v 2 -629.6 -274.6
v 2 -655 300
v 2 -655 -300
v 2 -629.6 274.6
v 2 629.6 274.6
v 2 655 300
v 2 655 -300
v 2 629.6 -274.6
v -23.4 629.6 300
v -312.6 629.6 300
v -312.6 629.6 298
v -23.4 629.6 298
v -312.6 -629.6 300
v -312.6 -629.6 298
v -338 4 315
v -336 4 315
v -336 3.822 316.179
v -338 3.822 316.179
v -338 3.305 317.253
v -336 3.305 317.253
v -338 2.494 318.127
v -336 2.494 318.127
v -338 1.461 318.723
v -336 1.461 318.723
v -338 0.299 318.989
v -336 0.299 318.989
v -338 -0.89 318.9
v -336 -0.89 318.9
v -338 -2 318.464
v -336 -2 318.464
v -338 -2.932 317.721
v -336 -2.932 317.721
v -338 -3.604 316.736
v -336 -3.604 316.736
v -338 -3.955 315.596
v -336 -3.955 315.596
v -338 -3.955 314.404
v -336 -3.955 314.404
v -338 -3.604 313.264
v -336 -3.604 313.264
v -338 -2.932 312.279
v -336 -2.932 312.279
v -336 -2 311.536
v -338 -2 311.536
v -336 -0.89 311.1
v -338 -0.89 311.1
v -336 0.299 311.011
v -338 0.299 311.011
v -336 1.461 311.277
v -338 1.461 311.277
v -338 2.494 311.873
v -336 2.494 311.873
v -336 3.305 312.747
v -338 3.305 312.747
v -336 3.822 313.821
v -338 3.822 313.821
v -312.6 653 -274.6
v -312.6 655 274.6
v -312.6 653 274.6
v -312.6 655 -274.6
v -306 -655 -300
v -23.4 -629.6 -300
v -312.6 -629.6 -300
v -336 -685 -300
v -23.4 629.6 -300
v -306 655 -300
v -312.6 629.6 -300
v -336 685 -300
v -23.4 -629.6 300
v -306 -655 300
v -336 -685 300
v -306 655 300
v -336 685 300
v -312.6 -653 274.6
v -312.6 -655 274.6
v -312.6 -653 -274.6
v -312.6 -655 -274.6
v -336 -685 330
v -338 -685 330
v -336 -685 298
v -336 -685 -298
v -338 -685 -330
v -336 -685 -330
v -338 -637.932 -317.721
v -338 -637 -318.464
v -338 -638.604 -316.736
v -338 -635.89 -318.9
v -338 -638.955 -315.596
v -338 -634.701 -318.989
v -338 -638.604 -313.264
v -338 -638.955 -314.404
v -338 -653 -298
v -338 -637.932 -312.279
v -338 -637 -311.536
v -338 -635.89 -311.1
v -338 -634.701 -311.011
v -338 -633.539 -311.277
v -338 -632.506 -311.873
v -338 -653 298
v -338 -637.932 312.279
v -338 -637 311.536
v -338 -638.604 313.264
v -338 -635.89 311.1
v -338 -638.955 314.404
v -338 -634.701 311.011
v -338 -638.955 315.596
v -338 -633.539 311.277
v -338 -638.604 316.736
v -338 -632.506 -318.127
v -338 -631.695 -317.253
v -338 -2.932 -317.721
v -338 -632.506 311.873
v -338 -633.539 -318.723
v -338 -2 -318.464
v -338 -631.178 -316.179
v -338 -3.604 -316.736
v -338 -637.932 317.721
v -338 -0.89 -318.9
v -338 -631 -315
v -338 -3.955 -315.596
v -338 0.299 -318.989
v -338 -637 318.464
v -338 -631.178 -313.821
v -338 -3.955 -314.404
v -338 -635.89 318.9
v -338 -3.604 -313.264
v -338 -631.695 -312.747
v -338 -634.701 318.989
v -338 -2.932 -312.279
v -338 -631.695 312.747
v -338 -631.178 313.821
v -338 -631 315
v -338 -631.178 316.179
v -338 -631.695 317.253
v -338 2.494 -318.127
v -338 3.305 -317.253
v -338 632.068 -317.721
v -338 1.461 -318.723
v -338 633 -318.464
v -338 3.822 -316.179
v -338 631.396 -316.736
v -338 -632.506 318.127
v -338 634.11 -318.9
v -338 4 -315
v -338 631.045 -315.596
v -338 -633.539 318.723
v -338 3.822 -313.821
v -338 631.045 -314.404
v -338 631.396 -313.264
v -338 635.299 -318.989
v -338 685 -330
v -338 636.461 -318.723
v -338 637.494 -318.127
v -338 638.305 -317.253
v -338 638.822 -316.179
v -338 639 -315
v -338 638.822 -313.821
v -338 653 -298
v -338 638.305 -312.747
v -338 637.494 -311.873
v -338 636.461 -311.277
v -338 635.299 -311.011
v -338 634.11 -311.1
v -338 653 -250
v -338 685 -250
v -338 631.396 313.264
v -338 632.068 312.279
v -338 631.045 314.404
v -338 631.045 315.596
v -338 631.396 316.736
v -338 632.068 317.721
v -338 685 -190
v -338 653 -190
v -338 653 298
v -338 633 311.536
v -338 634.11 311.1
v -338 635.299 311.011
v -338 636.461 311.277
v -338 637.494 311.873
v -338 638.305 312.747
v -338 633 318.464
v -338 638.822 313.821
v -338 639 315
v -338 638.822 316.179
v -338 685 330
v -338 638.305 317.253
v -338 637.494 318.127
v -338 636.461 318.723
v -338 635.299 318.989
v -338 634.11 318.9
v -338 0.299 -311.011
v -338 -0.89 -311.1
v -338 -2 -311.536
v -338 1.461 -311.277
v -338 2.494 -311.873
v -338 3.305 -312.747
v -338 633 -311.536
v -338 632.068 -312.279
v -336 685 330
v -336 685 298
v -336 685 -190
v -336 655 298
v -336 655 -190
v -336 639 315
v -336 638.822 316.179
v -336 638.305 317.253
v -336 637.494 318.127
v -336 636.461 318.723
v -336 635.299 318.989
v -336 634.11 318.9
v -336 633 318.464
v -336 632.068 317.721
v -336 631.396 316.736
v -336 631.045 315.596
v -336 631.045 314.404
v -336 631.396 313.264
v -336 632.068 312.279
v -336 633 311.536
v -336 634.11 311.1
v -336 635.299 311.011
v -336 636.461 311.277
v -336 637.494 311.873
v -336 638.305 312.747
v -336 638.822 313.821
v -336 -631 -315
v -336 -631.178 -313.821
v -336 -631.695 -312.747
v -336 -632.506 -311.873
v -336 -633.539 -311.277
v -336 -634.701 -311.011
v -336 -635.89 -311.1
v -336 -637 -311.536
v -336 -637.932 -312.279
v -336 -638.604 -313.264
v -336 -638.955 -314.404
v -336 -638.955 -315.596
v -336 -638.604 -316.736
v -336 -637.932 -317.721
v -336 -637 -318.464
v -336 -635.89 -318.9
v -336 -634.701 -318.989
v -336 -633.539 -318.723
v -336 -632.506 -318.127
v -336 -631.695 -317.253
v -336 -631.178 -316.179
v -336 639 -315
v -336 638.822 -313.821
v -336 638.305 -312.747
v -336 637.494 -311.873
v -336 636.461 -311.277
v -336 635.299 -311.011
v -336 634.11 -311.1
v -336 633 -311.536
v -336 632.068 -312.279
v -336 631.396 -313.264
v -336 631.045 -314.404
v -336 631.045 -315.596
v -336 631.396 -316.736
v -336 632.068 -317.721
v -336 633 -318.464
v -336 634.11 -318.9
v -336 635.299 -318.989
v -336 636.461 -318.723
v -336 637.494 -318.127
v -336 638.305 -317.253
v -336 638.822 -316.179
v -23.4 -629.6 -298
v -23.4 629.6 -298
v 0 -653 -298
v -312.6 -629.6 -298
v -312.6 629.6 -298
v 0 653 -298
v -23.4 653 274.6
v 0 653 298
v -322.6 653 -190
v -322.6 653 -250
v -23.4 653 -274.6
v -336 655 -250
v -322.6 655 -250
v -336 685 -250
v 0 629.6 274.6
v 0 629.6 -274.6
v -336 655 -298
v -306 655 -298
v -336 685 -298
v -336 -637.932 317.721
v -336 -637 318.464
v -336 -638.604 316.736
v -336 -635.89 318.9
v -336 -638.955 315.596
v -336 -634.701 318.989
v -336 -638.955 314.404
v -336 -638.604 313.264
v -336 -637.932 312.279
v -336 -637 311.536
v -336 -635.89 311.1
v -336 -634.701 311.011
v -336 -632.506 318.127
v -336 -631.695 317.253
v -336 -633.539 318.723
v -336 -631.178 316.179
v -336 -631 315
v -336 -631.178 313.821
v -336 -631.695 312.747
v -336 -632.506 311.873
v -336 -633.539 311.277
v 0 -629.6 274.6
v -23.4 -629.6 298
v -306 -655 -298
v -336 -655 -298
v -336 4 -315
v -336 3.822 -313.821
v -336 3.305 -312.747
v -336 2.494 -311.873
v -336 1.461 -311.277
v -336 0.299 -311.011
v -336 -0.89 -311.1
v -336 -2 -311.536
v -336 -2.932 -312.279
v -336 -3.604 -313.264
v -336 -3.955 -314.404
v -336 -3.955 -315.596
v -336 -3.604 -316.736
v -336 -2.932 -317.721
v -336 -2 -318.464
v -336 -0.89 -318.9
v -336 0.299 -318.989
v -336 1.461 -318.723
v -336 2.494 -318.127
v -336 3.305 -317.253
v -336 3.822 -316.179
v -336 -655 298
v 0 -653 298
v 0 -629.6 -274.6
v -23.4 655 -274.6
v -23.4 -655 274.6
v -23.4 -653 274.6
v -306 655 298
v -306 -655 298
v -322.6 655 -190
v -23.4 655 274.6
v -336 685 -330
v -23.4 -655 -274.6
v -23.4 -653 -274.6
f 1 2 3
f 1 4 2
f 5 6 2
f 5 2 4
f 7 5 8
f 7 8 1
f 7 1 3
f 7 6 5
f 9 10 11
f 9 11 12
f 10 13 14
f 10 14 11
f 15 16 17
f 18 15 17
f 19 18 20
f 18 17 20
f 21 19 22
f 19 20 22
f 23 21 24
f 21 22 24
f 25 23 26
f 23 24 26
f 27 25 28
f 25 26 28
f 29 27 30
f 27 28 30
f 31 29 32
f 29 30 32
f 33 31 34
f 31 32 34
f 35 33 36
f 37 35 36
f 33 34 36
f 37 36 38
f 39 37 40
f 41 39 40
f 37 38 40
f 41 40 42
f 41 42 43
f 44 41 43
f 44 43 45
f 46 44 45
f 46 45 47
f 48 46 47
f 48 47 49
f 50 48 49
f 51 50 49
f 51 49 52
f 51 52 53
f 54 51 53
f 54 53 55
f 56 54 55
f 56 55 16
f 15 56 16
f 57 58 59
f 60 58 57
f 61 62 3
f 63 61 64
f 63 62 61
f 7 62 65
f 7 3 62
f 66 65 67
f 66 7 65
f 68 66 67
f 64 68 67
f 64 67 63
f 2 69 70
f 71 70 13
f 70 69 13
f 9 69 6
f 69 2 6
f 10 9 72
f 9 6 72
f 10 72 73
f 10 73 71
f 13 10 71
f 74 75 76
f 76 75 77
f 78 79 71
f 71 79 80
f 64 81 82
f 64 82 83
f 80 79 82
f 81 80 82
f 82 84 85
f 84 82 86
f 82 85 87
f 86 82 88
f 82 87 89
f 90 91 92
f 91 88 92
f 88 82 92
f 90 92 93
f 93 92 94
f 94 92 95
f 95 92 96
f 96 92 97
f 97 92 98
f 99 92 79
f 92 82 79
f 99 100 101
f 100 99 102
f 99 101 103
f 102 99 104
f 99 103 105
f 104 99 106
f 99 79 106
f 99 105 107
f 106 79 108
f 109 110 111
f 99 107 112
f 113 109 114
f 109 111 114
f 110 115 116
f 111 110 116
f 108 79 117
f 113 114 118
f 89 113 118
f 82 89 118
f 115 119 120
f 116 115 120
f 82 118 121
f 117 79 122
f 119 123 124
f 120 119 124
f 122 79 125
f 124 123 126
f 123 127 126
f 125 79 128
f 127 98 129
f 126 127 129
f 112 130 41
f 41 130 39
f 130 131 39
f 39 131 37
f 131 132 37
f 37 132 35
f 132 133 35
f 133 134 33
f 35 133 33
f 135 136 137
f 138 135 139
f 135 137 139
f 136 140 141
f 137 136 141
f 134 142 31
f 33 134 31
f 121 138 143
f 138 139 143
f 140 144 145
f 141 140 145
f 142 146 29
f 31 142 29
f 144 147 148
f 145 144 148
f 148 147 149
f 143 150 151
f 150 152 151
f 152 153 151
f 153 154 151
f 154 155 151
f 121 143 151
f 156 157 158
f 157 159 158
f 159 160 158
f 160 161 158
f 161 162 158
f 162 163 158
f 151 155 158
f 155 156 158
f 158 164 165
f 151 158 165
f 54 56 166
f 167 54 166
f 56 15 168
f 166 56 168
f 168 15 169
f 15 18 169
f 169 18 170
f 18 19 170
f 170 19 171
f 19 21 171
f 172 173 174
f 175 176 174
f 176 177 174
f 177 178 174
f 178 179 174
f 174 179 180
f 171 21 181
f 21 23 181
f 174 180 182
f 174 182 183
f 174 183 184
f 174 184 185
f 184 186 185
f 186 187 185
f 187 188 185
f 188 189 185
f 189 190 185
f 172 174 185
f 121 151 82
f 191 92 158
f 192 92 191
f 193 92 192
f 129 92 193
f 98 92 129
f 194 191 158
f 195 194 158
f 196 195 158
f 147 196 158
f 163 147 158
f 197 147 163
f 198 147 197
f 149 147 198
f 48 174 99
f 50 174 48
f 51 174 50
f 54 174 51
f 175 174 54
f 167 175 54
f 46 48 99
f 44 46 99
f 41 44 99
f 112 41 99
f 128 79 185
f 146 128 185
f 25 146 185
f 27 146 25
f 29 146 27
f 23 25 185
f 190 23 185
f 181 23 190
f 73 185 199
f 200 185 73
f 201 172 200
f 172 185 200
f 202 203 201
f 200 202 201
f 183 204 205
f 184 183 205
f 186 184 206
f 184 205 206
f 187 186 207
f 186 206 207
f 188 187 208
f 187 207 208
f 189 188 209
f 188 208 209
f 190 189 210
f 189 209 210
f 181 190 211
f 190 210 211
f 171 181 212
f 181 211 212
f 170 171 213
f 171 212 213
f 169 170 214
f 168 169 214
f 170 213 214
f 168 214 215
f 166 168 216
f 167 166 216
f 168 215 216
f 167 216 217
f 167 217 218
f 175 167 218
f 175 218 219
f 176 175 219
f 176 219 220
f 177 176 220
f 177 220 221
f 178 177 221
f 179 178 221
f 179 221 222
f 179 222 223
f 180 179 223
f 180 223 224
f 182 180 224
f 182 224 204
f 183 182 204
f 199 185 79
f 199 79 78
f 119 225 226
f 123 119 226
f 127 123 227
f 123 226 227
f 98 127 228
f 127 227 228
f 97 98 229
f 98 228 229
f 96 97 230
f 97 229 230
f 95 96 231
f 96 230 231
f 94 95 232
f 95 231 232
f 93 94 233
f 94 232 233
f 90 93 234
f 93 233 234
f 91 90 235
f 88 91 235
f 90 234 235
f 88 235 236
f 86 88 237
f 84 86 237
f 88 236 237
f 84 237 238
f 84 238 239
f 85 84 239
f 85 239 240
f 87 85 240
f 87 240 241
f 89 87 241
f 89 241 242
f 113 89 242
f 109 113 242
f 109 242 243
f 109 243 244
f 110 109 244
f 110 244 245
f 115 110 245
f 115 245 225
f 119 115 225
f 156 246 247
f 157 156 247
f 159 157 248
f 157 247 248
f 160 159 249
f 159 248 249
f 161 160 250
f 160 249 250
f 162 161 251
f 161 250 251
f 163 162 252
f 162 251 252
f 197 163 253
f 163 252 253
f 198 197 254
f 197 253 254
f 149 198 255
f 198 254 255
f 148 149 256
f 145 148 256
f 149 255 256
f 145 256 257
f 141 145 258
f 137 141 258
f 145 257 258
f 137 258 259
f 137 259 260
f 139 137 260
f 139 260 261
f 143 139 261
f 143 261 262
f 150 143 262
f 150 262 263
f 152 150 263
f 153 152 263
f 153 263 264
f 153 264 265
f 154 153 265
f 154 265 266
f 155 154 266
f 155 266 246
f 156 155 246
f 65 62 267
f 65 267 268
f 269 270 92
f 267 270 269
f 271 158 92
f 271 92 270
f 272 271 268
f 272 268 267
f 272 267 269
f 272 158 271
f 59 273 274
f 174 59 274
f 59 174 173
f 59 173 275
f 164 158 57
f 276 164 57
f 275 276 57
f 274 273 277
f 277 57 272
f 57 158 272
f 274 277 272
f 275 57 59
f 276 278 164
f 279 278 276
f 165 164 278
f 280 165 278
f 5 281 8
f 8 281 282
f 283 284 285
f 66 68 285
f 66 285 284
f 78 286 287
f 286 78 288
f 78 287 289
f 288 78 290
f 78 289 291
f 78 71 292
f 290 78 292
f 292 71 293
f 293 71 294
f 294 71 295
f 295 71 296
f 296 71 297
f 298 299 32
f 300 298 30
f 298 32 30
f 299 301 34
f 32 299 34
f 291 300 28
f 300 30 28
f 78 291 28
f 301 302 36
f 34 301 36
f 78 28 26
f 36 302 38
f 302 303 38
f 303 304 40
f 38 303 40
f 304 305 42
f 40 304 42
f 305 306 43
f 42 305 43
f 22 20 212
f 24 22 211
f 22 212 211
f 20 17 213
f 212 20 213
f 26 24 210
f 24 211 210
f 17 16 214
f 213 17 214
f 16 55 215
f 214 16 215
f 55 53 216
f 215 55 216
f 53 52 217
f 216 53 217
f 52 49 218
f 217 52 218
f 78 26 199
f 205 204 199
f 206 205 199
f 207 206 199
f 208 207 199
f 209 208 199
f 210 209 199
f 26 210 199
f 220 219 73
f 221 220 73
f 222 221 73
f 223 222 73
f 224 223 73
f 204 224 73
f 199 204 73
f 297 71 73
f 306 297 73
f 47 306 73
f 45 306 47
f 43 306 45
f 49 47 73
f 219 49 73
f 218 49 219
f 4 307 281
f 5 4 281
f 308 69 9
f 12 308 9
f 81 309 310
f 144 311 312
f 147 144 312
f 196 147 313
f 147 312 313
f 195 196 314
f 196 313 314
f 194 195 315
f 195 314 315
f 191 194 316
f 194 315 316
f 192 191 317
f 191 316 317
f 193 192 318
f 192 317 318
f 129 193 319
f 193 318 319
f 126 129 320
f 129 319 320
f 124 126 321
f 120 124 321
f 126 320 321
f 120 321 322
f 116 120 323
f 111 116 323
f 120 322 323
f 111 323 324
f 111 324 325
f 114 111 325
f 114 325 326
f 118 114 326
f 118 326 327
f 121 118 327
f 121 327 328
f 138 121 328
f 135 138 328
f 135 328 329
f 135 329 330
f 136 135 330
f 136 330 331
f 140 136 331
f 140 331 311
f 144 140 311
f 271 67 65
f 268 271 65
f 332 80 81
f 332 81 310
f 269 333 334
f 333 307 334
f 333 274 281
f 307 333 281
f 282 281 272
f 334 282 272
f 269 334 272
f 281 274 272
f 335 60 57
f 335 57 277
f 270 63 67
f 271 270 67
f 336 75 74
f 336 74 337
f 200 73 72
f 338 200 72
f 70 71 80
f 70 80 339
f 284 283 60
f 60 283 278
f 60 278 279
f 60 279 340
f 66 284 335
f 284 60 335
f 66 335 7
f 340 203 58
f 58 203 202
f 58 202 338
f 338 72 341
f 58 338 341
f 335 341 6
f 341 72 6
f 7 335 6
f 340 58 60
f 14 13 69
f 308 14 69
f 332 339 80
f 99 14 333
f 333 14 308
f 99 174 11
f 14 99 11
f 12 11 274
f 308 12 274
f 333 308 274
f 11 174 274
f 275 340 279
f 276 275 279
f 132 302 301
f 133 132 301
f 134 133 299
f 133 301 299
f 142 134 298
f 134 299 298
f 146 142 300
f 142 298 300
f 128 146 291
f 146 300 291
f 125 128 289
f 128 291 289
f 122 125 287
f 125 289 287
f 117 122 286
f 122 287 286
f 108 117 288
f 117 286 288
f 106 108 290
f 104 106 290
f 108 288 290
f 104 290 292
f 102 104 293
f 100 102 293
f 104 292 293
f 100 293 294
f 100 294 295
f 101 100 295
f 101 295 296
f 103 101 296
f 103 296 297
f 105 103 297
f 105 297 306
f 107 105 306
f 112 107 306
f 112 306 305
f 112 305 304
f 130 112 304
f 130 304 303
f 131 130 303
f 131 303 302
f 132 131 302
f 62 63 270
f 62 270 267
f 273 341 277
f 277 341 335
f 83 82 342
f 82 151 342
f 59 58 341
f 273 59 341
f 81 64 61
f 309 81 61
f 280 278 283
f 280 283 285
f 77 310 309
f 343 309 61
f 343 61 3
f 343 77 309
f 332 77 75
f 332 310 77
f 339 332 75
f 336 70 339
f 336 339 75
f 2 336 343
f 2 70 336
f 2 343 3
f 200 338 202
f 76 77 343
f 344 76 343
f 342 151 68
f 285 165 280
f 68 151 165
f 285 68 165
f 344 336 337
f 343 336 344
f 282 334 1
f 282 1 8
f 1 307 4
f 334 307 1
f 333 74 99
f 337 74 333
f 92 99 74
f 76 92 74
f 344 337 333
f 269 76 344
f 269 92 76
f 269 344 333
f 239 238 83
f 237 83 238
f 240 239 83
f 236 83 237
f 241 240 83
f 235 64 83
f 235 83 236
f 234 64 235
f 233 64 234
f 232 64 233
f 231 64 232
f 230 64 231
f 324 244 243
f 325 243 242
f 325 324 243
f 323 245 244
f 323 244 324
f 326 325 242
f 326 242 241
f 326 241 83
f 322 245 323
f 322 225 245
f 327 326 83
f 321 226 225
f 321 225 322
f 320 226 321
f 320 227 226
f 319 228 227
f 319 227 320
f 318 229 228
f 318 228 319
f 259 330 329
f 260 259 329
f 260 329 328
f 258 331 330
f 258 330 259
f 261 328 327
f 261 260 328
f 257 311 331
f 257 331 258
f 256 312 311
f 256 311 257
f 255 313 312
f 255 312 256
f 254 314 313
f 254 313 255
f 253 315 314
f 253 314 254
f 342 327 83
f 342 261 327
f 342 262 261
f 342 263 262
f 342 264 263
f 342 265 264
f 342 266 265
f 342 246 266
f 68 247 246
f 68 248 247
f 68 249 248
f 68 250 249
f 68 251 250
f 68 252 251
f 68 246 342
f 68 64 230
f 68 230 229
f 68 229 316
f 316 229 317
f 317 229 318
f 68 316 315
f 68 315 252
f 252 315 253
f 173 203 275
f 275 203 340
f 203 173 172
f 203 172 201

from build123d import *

# Parameters (mm, degrees)
SKETCH1_W            = 600
SKETCH1_H            = 1310
SKETCH1_W_2          = 549.2
SKETCH1_H_2          = 1259.2
BOSS_EXTRUDE1_DEPTH  = 2
SKETCH2_W            = 340
SKETCH2_H            = 1310
SKETCH2_W_2          = 289.2
SKETCH2_H_2          = 1259.2
BOSS_EXTRUDE2_DEPTH  = 2
SKETCH3_W            = 340
SKETCH3_H            = 600
SKETCH3_W_2          = 289.2
SKETCH3_H_2          = 549.2
BOSS_EXTRUDE3_DEPTH  = 2
SKETCH4_W            = 2
SKETCH4_H            = 1310
BOSS_EXTRUDE4_DEPTH  = 30
SKETCH5_W            = 2
SKETCH5_H            = 600
BOSS_EXTRUDE8_DEPTH  = 30
SKETCH8_W            = 2
SKETCH8_H            = 30
BOSS_EXTRUDE9_DEPTH  = 30
BOSS_EXTRUDE10_DEPTH = 2
SKETCH10_W           = 15.4
SKETCH10_H           = 60
CUT_EXTRUDE2_DEPTH   = 55
SKETCH11_R           = 4
CUT_EXTRUDE3_DEPTH   = 10


with BuildPart() as part:
    # Sketch1 → Boss-Extrude1 (new body)
    with BuildSketch(Plane(origin=(0, 0, 0), x_dir=(0, 0, -1), z_dir=(1, 0, 0))):
        Rectangle(SKETCH1_W, SKETCH1_H)
        Rectangle(SKETCH1_W_2, SKETCH1_H_2, mode=Mode.SUBTRACT)
    extrude(amount=BOSS_EXTRUDE1_DEPTH)

    # Sketch2 → Boss-Extrude2 (add)
    with BuildSketch(Plane.XY.offset(300)):
        with Locations((-168, 0)):
            Rectangle(SKETCH2_W, SKETCH2_H)
        with Locations((-168, 0)):
            Rectangle(SKETCH2_W_2, SKETCH2_H_2, mode=Mode.SUBTRACT)
    boss_extrude2 = extrude(amount=-BOSS_EXTRUDE2_DEPTH)

    # Sketch3 → Boss-Extrude3 (add)
    with BuildSketch(Plane(origin=(0, 655, 0), x_dir=(1, 0, 0), z_dir=(0, 1, 0))):
        with Locations((-168, 0)):
            Rectangle(SKETCH3_W, SKETCH3_H)
        with Locations((-168, 0)):
            Rectangle(SKETCH3_W_2, SKETCH3_H_2, mode=Mode.SUBTRACT)
    boss_extrude3 = extrude(amount=-BOSS_EXTRUDE3_DEPTH)

    # Mirror3: Boss-Extrude3 across plane
    add(boss_extrude3.mirror(Plane.ZX))

    # Mirror4: Boss-Extrude2 across plane
    add(boss_extrude2.mirror(Plane.XY))


with BuildPart() as body_2:
    # Sketch4 → Boss-Extrude4 (new body)
    with BuildSketch(Plane.XY.offset(300)):
        with Locations((-337, 0)):
            Rectangle(SKETCH4_W, SKETCH4_H)
    extrude(amount=BOSS_EXTRUDE4_DEPTH)


with BuildPart() as body_3:
    # Sketch5 → Boss-Extrude8 (new body)
    with BuildSketch(Plane(origin=(0, 655, 0), x_dir=(1, 0, 0), z_dir=(0, 1, 0))):
        with Locations((-337, 0)):
            Rectangle(SKETCH5_W, SKETCH5_H)
    extrude(amount=BOSS_EXTRUDE8_DEPTH)


with BuildPart() as body_4:
    # Sketch8 → Boss-Extrude9 (new body)
    with BuildSketch(Plane(origin=(0, 655, 0), x_dir=(1, 0, 0), z_dir=(0, 1, 0))):
        with Locations((-337, -315)):
            Rectangle(SKETCH8_W, SKETCH8_H)
    extrude(amount=BOSS_EXTRUDE9_DEPTH)


with BuildPart() as body_5:
    # Sketch9 → Boss-Extrude10 (new body)
    with BuildSketch(Plane.XY.offset(300)):
        Polygon((-336, 685), (-306, 655), (-336, 655), align=None)
    extrude(amount=-BOSS_EXTRUDE10_DEPTH)


with BuildPart() as body_6:
    # Mirror2: mirrored copy
    add(body_3.part.mirror(Plane.ZX))


with BuildPart() as body_7:
    # Mirror2 2: mirrored copy
    add(body_5.part.mirror(Plane.ZX))


with BuildPart() as body_8:
    # Mirror2 3: mirrored copy
    add(body_4.part.mirror(Plane.ZX))


with BuildPart() as body_9:
    # Mirror5: mirrored copy
    add(body_5.part.mirror(Plane.XY))


with BuildPart() as body_10:
    # Mirror5 2: mirrored copy
    add(body_4.part.mirror(Plane.XY))


with BuildPart() as body_11:
    # Mirror5 3: mirrored copy
    add(body_2.part.mirror(Plane.XY))


with BuildPart() as body_12:
    # Mirror5 4: mirrored copy
    add(body_7.part.mirror(Plane.XY))


with BuildPart() as body_13:
    # Mirror5 5: mirrored copy
    add(body_8.part.mirror(Plane.XY))


with BuildPart() as cut_extrude2_tool:
    # Sketch10 → Cut-Extrude2 (new body)
    with BuildSketch(Plane(origin=(0, 685, 0), x_dir=(1, 0, 0), z_dir=(0, 1, 0))):
        with Locations((-330.3, 220)):
            Rectangle(SKETCH10_W, SKETCH10_H)
    extrude(amount=-CUT_EXTRUDE2_DEPTH)


with BuildPart() as part_1:
    add(part.part)

    # Cut-Extrude2: cut by cut_extrude2_tool
    add(cut_extrude2_tool.part, mode=Mode.SUBTRACT)


with BuildPart() as body_3_1:
    add(body_3.part)

    # Cut-Extrude2: cut by cut_extrude2_tool
    add(cut_extrude2_tool.part, mode=Mode.SUBTRACT)


with BuildPart() as cut_extrude3_tool:
    # Sketch11 → Cut-Extrude3 (new body)
    with BuildSketch(Plane(origin=(-336, 0, 0), x_dir=(0, 0, -1), z_dir=(1, 0, 0))):
        with Locations(Location((315, 635, 0), (0, 0, 90))):
            Circle(SKETCH11_R)
        with Locations(Location((315, 0, 0), (0, 0, 90))):
            Circle(SKETCH11_R)
        with Locations(Location((315, -635, 0), (0, 0, 90))):
            Circle(SKETCH11_R)
        with Locations(Location((-315, -635, 0), (0, 0, 90))):
            Circle(SKETCH11_R)
        with Locations(Location((-315, 0, 0), (0, 0, 90))):
            Circle(SKETCH11_R)
        with Locations(Location((-315, 635, 0), (0, 0, 90))):
            Circle(SKETCH11_R)
    extrude(amount=-CUT_EXTRUDE3_DEPTH)


with BuildPart() as body_2_1:
    add(body_2.part)

    # Cut-Extrude3: cut by cut_extrude3_tool
    add(cut_extrude3_tool.part, mode=Mode.SUBTRACT)


with BuildPart() as body_11_1:
    add(body_11.part)

    # Cut-Extrude3: cut by cut_extrude3_tool
    add(cut_extrude3_tool.part, mode=Mode.SUBTRACT)


with BuildPart() as part_2:
    add(part_1.part)

    # Combine1: read off the stored shape, not the designer's step
    # Combine1: union body 3, body 12, body 10, body 13, body 6, body 8, body 4, body 2, body 11, body 9, body 7, body 5
    add(body_3_1.part)
    add(body_12.part)
    add(body_10.part)
    add(body_13.part)
    add(body_6.part)
    add(body_8.part)
    add(body_4.part)
    add(body_2_1.part)
    add(body_11_1.part)
    add(body_9.part)
    add(body_7.part)
    add(body_5.part)


solid = part_2.part
